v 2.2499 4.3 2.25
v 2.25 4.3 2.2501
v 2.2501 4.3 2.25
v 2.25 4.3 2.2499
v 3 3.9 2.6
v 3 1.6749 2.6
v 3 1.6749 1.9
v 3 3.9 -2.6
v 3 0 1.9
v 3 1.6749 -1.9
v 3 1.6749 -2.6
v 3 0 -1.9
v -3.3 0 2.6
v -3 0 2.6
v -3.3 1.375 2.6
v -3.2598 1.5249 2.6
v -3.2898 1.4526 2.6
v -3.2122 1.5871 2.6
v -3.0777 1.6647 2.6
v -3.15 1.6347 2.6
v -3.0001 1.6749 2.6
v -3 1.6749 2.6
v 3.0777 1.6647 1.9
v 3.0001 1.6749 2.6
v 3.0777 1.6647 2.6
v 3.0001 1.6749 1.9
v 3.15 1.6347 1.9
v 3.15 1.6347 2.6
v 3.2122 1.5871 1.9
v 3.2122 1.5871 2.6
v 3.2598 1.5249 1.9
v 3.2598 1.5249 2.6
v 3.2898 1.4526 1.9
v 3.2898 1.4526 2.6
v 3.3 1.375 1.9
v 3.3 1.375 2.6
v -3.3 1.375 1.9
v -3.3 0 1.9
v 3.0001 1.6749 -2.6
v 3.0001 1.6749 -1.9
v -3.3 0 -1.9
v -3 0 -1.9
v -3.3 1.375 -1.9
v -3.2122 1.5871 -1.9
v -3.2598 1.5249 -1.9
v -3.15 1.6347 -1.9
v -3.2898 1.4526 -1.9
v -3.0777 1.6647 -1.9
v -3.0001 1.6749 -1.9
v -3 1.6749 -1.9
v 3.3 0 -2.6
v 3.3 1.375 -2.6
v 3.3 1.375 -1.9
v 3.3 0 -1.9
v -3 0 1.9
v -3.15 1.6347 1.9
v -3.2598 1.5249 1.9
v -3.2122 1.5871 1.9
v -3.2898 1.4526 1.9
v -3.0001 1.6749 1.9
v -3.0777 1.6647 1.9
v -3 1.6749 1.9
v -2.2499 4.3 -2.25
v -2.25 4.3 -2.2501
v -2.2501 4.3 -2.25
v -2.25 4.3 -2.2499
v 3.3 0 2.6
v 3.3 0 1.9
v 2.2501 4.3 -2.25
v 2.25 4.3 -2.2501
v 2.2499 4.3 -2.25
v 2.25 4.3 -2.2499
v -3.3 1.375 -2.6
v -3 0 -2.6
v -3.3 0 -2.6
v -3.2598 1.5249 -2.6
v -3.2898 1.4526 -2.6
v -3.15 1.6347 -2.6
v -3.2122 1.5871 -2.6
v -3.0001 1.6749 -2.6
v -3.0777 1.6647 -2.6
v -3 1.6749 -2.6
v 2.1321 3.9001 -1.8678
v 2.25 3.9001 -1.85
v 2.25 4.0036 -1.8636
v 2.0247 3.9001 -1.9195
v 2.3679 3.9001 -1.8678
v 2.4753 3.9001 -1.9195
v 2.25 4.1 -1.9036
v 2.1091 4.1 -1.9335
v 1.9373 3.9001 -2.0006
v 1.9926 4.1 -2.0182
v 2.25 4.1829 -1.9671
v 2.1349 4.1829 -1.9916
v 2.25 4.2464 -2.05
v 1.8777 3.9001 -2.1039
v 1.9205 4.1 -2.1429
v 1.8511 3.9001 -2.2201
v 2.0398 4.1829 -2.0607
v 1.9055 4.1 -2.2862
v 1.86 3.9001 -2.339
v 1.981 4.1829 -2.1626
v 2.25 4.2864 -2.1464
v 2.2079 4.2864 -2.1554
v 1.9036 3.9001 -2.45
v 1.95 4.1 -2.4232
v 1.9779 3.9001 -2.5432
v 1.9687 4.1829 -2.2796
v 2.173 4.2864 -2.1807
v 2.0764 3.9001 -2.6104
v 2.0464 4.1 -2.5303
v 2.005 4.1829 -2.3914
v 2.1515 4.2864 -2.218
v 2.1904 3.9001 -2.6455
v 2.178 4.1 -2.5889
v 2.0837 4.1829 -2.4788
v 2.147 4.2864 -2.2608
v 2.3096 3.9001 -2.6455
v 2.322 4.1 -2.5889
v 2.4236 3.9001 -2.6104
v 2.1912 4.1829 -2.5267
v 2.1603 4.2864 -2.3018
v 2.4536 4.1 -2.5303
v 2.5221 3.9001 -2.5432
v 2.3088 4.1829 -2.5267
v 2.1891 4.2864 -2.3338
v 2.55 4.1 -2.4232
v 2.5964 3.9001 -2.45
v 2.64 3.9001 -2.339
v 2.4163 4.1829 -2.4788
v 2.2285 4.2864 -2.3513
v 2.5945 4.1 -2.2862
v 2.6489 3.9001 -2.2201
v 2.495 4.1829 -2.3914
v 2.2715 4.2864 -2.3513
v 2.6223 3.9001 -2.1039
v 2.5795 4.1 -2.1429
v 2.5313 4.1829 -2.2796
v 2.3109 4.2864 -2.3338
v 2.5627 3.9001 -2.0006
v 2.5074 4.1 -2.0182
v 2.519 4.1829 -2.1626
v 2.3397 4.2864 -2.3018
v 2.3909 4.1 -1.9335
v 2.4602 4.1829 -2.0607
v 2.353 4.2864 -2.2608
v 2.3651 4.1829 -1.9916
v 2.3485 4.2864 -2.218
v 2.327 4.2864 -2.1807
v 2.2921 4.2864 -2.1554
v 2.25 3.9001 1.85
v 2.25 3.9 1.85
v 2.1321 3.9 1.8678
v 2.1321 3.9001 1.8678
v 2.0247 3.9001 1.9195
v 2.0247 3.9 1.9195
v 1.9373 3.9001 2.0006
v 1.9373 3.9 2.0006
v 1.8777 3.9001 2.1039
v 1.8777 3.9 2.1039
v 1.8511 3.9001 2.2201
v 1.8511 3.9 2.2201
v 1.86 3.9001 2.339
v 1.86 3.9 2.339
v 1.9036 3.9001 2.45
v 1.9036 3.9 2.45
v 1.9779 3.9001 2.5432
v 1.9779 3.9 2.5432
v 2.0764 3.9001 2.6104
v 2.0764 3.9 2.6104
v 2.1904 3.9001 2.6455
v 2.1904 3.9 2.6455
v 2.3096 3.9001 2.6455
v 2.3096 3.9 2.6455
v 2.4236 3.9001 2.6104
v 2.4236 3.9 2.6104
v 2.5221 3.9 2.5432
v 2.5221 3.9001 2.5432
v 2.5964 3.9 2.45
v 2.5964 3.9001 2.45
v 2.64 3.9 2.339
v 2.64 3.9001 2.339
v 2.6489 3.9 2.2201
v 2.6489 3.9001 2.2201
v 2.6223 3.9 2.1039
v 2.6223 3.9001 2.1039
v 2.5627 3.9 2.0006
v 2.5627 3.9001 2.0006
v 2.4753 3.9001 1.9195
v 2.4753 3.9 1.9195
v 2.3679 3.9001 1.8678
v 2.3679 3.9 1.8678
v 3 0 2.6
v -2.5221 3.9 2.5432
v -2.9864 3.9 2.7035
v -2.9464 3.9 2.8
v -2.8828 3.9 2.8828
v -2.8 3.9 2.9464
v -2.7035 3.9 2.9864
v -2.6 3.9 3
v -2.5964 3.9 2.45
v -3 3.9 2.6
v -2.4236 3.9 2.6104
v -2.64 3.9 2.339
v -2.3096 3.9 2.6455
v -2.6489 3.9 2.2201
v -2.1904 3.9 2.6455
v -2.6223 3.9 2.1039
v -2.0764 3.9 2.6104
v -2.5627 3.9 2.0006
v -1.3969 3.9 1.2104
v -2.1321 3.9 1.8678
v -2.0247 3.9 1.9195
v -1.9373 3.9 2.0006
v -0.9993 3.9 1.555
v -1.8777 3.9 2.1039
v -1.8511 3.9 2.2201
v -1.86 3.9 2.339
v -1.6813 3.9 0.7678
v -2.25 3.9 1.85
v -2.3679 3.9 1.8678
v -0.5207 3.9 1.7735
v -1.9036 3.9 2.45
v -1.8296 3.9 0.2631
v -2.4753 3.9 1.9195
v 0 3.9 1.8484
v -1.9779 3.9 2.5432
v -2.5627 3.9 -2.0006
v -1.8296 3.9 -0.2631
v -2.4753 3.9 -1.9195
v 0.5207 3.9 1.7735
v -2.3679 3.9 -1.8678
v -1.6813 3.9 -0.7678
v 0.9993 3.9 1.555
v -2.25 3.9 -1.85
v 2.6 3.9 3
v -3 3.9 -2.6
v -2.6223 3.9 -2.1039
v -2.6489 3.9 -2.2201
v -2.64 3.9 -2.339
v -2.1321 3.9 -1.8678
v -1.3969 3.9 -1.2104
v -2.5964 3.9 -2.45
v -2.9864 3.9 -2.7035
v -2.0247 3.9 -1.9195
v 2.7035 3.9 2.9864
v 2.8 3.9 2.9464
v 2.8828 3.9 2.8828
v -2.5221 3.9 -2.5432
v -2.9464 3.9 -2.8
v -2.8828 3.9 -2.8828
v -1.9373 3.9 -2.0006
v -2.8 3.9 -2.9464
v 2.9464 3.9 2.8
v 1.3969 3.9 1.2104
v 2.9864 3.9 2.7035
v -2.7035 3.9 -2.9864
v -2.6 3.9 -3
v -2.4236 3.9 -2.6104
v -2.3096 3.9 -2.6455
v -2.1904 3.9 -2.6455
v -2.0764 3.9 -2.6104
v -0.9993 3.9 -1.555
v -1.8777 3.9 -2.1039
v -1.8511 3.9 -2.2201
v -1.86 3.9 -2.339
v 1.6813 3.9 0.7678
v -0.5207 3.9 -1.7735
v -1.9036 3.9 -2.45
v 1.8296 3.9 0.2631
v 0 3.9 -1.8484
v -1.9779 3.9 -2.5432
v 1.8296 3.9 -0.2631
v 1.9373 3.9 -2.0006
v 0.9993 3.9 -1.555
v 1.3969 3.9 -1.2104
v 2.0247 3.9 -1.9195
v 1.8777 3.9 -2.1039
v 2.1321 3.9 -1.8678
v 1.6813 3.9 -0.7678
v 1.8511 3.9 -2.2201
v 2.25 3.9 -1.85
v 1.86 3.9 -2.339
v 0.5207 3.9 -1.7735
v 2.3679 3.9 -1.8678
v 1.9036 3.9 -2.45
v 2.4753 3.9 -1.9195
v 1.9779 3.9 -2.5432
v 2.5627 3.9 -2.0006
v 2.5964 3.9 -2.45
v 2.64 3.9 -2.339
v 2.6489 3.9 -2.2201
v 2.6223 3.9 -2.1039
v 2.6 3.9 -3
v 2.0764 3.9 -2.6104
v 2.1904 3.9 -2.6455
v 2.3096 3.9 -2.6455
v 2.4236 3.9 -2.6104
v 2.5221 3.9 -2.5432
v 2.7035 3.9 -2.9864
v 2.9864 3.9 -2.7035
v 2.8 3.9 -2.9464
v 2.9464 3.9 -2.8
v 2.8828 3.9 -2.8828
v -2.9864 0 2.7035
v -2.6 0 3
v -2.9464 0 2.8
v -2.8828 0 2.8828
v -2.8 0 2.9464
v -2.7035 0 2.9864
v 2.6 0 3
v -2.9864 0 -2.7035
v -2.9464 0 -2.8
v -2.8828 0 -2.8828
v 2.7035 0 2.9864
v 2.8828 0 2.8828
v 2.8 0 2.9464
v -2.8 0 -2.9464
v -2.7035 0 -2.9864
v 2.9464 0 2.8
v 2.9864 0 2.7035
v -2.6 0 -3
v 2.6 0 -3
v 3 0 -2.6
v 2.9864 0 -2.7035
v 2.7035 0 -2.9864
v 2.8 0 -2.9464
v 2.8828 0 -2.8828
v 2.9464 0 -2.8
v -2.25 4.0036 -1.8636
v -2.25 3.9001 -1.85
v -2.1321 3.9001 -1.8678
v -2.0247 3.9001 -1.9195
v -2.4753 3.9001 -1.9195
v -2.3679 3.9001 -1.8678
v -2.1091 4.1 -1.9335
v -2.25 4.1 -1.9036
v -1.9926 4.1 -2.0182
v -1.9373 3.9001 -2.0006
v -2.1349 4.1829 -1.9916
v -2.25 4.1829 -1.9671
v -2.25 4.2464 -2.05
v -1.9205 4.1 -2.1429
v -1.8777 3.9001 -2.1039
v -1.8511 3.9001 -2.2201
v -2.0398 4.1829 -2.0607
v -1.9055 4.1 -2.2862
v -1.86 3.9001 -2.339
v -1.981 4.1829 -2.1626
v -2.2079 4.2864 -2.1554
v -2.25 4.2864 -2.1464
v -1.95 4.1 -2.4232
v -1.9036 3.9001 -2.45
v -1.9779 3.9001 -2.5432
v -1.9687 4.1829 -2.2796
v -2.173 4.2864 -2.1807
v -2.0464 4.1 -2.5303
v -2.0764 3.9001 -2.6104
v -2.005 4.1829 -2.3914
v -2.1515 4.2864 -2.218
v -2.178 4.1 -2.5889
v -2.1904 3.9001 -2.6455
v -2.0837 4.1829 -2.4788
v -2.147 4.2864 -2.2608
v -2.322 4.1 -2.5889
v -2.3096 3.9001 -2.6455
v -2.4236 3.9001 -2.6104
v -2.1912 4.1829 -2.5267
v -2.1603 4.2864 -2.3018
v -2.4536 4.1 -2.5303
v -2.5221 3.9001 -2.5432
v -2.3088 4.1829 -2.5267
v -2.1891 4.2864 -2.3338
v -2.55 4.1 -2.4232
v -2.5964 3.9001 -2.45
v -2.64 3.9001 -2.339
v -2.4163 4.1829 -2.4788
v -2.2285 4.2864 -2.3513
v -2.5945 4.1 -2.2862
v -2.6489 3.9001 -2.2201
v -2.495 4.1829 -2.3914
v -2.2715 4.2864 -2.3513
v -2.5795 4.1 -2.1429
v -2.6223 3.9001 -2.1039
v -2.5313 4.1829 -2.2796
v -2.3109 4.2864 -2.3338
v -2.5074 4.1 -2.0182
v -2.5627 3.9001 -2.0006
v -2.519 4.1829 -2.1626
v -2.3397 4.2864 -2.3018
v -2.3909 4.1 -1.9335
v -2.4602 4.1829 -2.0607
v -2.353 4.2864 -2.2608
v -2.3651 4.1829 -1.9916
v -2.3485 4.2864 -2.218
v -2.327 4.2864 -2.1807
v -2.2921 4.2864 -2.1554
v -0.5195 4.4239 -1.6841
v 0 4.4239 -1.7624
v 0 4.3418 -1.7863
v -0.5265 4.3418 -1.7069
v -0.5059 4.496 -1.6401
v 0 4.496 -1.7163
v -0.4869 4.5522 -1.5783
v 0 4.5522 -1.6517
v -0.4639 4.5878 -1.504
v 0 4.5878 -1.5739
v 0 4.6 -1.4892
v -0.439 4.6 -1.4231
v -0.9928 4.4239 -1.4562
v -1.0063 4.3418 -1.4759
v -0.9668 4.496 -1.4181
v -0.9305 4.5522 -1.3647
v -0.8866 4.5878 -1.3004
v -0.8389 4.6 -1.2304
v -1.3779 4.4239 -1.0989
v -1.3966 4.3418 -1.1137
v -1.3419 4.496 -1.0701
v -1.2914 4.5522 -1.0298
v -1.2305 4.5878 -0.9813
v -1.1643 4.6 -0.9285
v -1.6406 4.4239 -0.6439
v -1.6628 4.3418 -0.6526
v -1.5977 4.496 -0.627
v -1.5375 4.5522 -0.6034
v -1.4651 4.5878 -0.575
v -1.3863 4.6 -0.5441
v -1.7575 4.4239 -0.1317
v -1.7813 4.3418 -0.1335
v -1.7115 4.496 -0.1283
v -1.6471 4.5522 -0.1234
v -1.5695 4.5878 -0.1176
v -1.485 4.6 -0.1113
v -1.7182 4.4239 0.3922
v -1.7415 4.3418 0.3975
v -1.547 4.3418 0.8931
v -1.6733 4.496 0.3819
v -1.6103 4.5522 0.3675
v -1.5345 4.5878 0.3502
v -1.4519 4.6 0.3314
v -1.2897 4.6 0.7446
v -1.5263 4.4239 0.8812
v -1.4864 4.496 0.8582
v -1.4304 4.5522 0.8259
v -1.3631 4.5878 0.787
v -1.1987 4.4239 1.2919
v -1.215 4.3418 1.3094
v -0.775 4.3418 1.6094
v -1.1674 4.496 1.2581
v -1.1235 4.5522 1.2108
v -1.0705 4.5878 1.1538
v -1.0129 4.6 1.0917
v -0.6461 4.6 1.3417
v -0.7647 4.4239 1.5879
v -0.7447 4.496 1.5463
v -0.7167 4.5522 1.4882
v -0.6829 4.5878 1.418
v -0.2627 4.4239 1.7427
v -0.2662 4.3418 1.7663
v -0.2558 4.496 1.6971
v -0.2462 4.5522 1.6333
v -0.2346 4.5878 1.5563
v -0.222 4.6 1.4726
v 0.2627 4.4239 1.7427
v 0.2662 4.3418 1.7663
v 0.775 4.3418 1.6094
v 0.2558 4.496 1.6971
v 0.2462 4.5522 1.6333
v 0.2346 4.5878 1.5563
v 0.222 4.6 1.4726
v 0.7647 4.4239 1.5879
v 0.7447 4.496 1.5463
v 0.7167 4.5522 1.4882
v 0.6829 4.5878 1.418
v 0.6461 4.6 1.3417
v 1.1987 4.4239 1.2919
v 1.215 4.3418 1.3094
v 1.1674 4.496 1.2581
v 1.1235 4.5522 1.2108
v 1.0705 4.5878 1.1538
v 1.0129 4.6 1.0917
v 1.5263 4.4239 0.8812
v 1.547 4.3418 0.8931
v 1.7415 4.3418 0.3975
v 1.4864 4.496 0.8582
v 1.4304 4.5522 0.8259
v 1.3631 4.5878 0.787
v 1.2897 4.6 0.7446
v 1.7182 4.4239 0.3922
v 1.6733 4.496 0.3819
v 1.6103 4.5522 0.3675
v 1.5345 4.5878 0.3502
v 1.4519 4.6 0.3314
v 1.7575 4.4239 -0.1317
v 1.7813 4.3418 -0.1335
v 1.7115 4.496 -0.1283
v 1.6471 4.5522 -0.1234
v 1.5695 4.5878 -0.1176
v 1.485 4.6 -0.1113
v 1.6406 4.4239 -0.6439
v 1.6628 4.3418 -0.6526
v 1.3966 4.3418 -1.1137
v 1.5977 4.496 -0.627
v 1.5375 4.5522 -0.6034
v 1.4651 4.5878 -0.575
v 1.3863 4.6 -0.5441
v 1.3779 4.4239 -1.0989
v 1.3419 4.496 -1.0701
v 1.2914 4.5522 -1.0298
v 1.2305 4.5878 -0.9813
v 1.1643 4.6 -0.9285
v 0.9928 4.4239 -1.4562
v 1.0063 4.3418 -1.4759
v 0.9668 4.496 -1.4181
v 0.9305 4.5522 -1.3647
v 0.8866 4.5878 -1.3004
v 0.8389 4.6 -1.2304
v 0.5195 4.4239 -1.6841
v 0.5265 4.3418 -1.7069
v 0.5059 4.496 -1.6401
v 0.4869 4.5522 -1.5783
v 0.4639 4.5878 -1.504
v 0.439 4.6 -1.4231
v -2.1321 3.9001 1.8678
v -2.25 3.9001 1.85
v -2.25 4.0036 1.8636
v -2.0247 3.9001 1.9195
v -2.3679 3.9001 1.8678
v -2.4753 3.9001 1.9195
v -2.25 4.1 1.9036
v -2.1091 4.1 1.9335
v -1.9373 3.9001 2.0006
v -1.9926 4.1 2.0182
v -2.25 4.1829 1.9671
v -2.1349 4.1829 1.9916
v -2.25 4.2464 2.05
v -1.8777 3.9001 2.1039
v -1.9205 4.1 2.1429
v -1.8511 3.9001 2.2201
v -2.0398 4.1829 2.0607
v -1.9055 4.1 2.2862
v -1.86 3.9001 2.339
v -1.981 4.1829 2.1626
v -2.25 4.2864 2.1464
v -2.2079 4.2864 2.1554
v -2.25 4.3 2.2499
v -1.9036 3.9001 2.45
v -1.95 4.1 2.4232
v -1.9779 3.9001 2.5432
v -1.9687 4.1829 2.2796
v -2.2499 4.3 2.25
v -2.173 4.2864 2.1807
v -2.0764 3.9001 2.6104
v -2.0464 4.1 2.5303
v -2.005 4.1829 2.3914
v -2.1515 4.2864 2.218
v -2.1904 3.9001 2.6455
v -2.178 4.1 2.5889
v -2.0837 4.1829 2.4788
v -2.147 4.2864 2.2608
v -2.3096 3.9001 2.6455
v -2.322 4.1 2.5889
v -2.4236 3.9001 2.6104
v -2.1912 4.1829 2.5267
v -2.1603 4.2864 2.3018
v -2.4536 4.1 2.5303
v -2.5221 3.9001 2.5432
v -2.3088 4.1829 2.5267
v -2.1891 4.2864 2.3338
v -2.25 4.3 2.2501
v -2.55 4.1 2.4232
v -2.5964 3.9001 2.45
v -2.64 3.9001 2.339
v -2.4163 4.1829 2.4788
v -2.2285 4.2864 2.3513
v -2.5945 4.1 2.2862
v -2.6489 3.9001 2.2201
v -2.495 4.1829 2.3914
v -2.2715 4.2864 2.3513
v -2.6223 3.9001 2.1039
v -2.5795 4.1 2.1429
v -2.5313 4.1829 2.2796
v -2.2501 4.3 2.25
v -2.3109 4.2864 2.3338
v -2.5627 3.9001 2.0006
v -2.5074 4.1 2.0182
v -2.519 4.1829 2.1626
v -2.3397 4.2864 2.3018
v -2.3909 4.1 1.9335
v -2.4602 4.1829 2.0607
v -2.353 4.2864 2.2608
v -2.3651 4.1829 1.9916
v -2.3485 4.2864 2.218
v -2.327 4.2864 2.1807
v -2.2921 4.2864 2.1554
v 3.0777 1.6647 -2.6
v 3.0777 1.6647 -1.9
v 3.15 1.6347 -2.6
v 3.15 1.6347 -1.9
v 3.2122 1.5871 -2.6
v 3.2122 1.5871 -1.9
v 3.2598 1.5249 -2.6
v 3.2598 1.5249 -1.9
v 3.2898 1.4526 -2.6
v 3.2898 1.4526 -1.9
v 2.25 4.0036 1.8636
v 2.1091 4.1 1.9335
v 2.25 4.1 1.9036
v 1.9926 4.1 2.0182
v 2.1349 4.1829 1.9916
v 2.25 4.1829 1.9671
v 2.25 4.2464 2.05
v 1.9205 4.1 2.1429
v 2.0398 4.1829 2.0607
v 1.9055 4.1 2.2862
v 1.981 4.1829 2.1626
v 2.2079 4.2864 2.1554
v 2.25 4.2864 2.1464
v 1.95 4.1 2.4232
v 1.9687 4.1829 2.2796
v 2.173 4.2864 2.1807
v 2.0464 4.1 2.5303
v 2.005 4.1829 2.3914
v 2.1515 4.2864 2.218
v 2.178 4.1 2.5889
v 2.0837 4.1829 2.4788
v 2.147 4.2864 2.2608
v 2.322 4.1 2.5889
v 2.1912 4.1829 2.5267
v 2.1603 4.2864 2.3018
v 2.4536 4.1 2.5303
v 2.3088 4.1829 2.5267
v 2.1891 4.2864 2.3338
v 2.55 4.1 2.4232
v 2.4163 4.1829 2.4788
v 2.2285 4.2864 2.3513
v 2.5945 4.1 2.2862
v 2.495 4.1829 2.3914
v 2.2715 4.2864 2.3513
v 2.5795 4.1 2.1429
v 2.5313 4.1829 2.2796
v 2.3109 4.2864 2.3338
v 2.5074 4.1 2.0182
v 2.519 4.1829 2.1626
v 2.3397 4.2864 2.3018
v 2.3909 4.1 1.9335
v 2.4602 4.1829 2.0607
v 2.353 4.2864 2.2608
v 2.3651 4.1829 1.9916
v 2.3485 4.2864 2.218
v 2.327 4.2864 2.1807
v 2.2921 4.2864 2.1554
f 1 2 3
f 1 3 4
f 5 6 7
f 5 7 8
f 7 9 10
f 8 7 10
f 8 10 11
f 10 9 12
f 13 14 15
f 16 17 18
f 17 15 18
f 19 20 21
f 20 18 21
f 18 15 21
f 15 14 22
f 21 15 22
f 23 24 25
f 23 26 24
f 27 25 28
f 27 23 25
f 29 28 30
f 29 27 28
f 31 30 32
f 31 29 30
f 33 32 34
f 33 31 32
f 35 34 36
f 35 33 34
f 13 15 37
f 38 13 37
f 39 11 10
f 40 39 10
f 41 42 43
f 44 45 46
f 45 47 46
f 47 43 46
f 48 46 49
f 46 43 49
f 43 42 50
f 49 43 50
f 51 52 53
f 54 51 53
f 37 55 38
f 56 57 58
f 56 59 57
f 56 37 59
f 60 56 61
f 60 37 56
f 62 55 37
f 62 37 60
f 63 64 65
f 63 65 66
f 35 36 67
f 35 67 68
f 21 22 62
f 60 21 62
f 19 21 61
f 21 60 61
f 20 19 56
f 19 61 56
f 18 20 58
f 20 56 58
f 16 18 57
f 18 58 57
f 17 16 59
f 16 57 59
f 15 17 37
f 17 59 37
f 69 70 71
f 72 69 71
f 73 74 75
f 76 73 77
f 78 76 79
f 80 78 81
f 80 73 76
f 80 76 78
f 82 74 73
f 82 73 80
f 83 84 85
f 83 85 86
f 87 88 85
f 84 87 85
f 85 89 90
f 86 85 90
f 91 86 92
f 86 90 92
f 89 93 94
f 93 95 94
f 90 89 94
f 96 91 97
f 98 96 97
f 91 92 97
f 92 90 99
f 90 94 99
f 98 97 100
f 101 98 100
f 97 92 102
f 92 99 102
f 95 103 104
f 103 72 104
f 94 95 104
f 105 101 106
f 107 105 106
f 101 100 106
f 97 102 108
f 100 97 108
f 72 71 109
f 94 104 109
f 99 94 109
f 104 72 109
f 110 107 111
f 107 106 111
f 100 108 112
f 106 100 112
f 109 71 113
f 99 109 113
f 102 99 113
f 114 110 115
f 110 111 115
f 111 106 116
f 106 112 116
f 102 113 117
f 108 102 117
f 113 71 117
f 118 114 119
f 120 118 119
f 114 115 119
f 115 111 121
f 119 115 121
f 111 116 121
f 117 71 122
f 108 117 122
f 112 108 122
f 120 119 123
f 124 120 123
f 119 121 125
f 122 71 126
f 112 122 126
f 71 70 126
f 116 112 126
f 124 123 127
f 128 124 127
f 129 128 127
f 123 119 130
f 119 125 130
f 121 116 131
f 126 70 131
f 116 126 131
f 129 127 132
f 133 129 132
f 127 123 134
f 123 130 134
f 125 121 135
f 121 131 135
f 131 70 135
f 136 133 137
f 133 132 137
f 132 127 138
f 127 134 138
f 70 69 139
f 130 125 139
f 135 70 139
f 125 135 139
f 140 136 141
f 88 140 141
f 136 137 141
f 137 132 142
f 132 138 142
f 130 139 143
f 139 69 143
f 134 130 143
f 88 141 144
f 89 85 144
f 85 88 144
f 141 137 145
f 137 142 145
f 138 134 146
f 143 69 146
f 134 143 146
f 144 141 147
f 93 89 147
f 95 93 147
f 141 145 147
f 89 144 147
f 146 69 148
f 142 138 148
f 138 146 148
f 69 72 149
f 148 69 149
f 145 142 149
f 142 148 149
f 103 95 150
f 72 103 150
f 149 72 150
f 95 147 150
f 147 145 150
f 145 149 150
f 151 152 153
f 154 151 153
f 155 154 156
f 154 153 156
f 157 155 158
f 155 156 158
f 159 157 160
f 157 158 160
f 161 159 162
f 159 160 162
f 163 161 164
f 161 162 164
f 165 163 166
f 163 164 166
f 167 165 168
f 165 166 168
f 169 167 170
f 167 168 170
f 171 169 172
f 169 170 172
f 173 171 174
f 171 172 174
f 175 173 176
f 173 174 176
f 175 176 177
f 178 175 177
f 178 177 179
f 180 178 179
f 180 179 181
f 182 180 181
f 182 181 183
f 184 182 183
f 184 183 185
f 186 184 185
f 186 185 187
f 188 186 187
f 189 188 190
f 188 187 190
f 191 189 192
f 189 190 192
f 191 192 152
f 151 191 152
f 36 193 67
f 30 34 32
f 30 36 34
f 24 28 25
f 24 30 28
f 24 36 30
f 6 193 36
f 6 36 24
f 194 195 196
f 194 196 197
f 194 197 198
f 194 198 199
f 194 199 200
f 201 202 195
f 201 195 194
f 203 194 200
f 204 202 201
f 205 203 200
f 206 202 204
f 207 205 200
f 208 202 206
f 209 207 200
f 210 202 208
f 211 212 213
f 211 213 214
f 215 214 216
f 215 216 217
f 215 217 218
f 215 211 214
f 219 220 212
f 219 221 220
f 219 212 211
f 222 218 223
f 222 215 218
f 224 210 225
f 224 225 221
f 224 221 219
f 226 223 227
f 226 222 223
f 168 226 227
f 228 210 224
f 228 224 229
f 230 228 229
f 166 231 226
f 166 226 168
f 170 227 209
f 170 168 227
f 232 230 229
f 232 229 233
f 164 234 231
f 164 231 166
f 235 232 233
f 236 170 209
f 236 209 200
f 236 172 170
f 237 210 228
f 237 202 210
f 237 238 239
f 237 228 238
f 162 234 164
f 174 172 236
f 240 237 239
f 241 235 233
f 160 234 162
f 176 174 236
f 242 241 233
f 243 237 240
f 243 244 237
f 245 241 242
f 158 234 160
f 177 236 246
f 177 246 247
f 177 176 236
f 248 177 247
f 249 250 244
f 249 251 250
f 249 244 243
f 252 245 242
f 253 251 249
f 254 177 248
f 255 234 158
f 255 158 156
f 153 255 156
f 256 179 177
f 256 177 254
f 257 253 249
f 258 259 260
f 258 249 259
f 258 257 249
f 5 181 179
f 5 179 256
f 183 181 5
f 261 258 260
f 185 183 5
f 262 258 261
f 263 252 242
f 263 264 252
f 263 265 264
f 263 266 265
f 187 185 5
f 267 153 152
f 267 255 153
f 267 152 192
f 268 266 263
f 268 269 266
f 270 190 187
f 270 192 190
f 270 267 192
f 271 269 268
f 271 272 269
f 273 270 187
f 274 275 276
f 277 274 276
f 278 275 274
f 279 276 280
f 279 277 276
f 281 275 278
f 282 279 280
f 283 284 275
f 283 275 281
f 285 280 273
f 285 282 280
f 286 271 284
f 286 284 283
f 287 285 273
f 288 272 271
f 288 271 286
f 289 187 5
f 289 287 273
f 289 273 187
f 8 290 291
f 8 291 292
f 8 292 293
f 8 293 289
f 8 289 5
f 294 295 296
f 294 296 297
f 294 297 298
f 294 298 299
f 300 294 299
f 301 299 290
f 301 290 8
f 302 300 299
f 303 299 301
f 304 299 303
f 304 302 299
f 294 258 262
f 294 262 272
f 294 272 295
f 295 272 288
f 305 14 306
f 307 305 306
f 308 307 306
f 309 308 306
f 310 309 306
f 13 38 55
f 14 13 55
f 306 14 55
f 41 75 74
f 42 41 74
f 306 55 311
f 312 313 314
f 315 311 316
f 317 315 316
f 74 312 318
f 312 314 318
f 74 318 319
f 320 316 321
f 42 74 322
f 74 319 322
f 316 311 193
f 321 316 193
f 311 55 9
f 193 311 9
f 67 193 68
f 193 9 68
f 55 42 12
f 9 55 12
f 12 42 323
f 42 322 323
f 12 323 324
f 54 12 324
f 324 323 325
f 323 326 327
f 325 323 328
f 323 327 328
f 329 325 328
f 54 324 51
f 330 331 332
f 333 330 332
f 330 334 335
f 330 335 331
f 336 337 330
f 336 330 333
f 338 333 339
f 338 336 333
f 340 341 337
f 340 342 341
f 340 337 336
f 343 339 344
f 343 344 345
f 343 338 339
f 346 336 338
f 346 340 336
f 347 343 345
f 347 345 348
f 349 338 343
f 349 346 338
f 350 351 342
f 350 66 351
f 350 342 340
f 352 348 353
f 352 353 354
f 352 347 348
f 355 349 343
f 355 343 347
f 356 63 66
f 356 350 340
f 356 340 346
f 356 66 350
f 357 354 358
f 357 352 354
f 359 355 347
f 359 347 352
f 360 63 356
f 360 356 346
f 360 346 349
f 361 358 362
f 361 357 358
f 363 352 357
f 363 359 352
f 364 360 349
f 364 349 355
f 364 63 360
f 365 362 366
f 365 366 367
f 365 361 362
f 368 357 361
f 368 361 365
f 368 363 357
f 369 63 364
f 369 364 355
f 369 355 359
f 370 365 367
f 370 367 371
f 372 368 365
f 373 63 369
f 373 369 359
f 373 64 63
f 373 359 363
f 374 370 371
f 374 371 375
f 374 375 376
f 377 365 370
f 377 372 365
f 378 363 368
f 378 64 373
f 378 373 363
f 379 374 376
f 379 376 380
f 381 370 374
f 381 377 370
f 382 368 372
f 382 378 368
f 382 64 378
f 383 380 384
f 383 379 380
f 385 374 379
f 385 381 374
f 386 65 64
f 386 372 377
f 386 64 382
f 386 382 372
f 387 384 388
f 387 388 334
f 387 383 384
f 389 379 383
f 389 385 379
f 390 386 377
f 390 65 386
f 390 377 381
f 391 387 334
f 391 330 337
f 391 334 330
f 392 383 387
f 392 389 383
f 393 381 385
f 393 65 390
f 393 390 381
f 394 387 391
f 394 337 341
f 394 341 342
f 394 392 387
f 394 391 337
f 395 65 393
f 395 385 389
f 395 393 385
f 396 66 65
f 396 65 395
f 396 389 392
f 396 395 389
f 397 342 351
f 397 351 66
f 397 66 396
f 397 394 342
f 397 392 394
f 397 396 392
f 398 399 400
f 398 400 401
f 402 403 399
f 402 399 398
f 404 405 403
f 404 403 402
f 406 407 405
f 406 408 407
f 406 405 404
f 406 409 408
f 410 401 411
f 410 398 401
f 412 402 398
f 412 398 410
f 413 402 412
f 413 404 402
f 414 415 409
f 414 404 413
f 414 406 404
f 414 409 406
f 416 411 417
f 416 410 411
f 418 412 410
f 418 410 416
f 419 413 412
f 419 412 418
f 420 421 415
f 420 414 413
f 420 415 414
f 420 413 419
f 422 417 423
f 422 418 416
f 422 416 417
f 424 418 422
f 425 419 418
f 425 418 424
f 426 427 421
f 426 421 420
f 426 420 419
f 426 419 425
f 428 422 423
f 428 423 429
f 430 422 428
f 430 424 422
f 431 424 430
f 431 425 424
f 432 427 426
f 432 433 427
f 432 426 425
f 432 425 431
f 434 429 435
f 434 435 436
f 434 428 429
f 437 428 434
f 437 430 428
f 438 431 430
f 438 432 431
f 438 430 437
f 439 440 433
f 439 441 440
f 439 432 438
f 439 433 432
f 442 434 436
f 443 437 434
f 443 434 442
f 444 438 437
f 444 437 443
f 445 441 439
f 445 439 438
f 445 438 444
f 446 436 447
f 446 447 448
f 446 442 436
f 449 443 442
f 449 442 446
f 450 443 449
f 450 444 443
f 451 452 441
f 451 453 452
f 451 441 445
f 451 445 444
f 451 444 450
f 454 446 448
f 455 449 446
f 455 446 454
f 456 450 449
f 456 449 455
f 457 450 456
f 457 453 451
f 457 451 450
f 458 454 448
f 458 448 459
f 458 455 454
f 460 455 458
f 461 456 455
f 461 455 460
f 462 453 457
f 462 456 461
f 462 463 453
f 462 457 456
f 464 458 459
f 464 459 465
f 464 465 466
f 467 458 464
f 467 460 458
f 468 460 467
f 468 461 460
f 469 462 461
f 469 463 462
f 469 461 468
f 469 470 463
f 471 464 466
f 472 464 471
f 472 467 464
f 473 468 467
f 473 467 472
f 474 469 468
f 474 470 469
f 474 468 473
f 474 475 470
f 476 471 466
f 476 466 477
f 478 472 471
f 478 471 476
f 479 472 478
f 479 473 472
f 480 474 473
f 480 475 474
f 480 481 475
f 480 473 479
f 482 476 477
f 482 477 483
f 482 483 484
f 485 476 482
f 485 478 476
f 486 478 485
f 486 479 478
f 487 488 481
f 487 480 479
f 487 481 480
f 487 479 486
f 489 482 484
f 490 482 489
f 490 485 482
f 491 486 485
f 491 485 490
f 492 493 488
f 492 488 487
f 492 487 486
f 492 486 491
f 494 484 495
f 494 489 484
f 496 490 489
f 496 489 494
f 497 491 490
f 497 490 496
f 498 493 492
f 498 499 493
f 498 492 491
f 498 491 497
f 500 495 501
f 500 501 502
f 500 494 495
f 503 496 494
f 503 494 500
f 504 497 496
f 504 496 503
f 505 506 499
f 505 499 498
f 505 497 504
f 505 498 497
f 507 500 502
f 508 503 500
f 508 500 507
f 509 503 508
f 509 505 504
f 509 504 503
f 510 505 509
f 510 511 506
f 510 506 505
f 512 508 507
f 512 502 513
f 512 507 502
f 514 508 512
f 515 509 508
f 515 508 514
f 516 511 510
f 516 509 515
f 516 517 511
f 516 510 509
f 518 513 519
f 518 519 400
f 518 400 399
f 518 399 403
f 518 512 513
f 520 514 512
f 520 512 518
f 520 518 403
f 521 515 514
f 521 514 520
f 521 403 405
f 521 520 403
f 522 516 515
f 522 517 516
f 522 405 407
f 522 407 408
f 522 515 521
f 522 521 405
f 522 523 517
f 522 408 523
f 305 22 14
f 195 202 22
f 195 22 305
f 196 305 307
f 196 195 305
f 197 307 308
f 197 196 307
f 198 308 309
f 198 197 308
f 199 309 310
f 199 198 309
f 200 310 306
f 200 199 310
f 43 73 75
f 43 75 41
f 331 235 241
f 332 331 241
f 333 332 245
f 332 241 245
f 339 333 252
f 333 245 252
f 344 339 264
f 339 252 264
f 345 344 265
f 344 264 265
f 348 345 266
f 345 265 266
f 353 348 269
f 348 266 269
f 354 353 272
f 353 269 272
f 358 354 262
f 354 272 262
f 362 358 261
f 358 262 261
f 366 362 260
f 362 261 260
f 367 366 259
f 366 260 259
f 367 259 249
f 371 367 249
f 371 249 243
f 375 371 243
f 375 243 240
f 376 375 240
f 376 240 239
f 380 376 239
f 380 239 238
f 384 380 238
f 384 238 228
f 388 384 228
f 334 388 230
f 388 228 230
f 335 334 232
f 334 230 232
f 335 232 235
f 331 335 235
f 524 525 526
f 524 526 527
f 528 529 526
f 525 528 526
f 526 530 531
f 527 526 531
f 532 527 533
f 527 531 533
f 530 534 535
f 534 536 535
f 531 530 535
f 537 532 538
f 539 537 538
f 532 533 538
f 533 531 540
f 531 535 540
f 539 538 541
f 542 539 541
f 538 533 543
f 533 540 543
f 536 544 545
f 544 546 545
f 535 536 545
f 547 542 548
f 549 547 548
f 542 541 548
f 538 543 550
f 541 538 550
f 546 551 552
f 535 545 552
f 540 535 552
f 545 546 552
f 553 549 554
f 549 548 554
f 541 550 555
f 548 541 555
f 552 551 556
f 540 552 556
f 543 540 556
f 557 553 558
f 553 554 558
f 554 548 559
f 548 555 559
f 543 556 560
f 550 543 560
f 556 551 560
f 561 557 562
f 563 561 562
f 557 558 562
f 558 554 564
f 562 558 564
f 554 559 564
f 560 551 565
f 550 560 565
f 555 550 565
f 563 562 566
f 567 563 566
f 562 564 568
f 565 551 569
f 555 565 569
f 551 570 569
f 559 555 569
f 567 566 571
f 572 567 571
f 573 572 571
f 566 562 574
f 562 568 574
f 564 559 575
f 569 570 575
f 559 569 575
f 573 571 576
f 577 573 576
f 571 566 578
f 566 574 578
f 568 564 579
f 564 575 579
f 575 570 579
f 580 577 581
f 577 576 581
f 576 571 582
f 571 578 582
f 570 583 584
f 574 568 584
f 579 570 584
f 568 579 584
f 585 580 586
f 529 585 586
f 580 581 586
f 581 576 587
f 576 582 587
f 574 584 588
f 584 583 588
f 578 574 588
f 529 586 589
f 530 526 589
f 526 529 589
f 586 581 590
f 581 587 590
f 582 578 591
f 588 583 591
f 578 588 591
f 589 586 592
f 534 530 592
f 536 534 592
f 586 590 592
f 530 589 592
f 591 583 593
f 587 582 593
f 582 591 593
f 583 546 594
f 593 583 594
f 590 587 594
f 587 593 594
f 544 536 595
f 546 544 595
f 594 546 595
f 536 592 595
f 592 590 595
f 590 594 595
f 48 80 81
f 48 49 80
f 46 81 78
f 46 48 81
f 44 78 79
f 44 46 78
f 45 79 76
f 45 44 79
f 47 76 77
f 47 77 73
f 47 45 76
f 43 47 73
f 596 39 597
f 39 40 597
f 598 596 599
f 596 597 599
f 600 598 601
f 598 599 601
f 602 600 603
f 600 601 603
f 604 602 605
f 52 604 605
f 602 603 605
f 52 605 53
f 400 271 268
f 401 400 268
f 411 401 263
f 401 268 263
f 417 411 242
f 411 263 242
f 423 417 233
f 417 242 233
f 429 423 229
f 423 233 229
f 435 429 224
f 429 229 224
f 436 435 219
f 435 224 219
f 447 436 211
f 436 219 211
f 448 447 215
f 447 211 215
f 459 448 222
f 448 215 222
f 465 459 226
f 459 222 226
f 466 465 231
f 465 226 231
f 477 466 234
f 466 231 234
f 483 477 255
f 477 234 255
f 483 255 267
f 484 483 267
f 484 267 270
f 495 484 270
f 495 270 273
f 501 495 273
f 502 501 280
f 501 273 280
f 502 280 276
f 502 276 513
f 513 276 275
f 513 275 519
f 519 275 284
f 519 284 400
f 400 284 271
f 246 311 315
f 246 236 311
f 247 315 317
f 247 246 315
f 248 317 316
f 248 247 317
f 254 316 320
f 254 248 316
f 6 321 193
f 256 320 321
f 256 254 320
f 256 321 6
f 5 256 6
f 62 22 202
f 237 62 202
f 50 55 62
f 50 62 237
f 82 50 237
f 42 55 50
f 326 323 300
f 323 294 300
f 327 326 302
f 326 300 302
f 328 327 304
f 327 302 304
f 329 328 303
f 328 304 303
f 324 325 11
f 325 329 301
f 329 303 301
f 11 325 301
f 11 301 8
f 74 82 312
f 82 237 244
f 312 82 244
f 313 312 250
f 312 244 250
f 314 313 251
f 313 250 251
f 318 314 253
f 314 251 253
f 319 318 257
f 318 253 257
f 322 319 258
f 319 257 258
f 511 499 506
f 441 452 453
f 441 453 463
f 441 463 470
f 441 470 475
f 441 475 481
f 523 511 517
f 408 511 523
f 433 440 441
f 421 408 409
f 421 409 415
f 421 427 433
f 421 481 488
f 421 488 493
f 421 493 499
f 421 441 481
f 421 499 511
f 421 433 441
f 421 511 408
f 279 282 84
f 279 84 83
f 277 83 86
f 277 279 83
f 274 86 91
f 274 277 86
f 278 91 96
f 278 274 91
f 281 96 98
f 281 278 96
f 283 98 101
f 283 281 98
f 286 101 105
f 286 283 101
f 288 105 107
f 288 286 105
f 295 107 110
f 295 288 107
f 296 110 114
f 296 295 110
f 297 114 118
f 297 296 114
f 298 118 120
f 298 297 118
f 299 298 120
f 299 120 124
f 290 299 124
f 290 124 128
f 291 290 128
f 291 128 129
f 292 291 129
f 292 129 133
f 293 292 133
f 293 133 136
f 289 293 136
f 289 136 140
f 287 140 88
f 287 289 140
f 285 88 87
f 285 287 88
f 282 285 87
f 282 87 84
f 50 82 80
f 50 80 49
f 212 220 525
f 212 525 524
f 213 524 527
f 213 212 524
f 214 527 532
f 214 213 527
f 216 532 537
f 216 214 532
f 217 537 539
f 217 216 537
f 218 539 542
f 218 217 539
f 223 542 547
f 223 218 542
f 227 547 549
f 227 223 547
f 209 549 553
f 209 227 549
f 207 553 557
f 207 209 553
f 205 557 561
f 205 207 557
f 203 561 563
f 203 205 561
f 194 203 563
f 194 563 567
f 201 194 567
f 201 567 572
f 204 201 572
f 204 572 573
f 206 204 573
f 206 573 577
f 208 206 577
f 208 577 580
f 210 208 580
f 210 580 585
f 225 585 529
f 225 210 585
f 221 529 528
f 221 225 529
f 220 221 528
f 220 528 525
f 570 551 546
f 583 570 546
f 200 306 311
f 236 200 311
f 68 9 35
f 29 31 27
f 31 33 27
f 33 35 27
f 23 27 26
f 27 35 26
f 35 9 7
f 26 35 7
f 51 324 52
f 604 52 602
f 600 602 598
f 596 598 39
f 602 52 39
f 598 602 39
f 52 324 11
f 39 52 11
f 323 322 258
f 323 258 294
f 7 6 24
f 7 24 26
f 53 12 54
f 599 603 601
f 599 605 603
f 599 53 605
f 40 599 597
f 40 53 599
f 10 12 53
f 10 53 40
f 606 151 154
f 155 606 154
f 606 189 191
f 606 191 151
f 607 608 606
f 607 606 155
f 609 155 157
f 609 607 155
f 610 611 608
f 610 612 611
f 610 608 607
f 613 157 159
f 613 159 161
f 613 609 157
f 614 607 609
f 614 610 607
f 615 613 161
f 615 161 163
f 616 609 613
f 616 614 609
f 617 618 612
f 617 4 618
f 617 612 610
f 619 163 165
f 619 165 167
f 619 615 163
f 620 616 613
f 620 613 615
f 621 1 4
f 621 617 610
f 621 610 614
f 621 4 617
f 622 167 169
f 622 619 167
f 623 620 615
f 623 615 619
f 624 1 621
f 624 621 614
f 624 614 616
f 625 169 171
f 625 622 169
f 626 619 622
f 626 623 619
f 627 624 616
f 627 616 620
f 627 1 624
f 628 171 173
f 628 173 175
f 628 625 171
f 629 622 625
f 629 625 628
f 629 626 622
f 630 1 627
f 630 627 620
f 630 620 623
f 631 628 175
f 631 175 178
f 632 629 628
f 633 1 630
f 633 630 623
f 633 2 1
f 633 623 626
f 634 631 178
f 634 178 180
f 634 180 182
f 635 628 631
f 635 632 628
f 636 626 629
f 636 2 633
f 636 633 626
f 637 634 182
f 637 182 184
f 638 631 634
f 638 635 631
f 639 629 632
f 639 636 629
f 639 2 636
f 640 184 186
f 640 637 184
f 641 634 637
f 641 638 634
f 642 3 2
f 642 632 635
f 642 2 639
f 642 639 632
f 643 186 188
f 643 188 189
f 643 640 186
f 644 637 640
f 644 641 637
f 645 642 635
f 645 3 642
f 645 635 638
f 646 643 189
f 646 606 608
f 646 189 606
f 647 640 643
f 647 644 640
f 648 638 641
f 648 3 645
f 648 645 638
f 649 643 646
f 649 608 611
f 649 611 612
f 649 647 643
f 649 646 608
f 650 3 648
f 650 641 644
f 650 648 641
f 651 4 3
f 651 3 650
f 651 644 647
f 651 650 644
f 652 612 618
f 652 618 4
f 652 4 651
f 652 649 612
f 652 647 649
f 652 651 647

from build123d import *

# Parameters (mm, degrees)
SKETCH1_W               = 6
SKETCH1_H               = 6
BOSS_EXTRUDE1_DEPTH     = 3.9
SKETCH2_W               = 0.7
SKETCH2_H               = 1.674896981
BOSS_EXTRUDE2_DEPTH     = 0.3
SKETCH3_R               = 0.4
BOSS_EXTRUDE3_DEPTH     = 0.4
MIRROR2_COPY_1_SKETCH_W = 0.7
MIRROR2_COPY_1_SKETCH_H = 1.674896981
MIRROR2_COPY_1_DEPTH    = 0.3
MIRROR2_COPY_2_SKETCH_R = 0.4
MIRROR2_COPY_2_DEPTH    = 0.4
FILLET1_R               = 0.4
FILLET2_R               = 0.4
SKETCH4_R               = 1.75
BOSS_EXTRUDE4_DEPTH     = 0.7
DRAFT1_ANGLE            = 8
FILLET3_R               = 0.3
FILLET4_R               = 0.3


with BuildPart() as part:
    # Sketch1 → Boss-Extrude1 (new body)
    with BuildSketch(Plane(origin=(0, 0, 0), x_dir=(1, 0, 0), z_dir=(0, 1, 0))):
        Rectangle(SKETCH1_W, SKETCH1_H)
    extrude(amount=BOSS_EXTRUDE1_DEPTH)

    # Sketch2 → Boss-Extrude2 (add)
    with BuildSketch(Plane(origin=(3, 0, 0), x_dir=(0, 0, -1), z_dir=(1, 0, 0))):
        with Locations((-2.25, 0.837448491)):
            Rectangle(SKETCH2_W, SKETCH2_H)
    boss_extrude2 = extrude(amount=BOSS_EXTRUDE2_DEPTH)

    # Sketch3 → Boss-Extrude3 (add)
    with BuildSketch(Plane(origin=(0, 3.9, 0), x_dir=(1, 0, 0), z_dir=(0, 1, 0))):
        with Locations(Location((2.25, -2.25, 0), (0, 0, 90))):
            Circle(SKETCH3_R)
    boss_extrude3 = extrude(amount=BOSS_EXTRUDE3_DEPTH)

    # Mirror1: Boss-Extrude2, Boss-Extrude3 across plane
    add(boss_extrude2.mirror(Plane.XY))
    add(boss_extrude3.mirror(Plane.XY))

    # Mirror2: Boss-Extrude2, Boss-Extrude3 across plane
    add(boss_extrude2.mirror(Plane(origin=(0, 0, 0), x_dir=(0, 0, 1), z_dir=(1, 0, 0))))
    add(boss_extrude3.mirror(Plane(origin=(0, 0, 0), x_dir=(0, 0, 1), z_dir=(1, 0, 0))))

    # Mirror2 copy 1 sketch → Mirror2 copy 1 (add)
    with BuildSketch(Plane.ZY.offset(3)):
        with Locations((-2.25, 0.837448491)):
            Rectangle(MIRROR2_COPY_1_SKETCH_W, MIRROR2_COPY_1_SKETCH_H)
    extrude(amount=MIRROR2_COPY_1_DEPTH)

    # Mirror2 copy 2 sketch → Mirror2 copy 2 (add)
    with BuildSketch(Plane(origin=(0, 3.9, 0), x_dir=(-1, 0, 0), z_dir=(0, 1, 0))):
        with Locations(Location((2.25, -2.25, 0), (0, 0, 90))):
            Circle(MIRROR2_COPY_2_SKETCH_R)
    extrude(amount=MIRROR2_COPY_2_DEPTH)

    # Fillet1
    fillet1_edges = [part.edges().sort_by_distance(p)[0] for p in [
        (2.25, 4.3, 2.65),
        (2.25, 4.3, -2.65),
        (-2.25, 4.3, -2.65),
        (-2.25, 4.3, 2.65),
    ]]
    fillet(fillet1_edges, radius=FILLET1_R - 0.0001)  # a hair under: the kernel refuses the full size

    # Fillet2
    fillet2_edges = [part.edges().sort_by_distance(p)[0] for p in [
        (3, 1.95, -3),
        (-3, 1.95, -3),
        (-3, 1.95, 3),
        (3, 1.95, 3),
    ]]
    fillet(fillet2_edges, radius=FILLET2_R)

    # Sketch4 → Boss-Extrude4 (add)
    with BuildSketch(Plane(origin=(0, 3.9, 0), x_dir=(1, 0, 0), z_dir=(0, 1, 0))):
        with Locations(Location((0, 0, 0), (0, 0, 90))):
            Circle(SKETCH4_R)
    extrude(amount=BOSS_EXTRUDE4_DEPTH)

    # Draft1
    draft1_faces = [part.faces().sort_by_distance(p)[0] for p in [
        (0, 4.25, 1.75),
    ]]
    draft(draft1_faces, Plane.ZX.offset(4.6), DRAFT1_ANGLE)

    # Fillet3
    fillet3_edges = [part.edges().sort_by_distance(p)[0] for p in [
        (0, 4.6, 1.75),
    ]]
    fillet(fillet3_edges, radius=FILLET3_R)

    # Fillet4
    fillet4_edges = [part.edges().sort_by_distance(p)[0] for p in [
        (-3.3, 1.674896981, -2.25),
        (-3.3, 1.674896981, 2.25),
        (3.3, 1.674896981, -2.25),
        (3.3, 1.674896981, 2.25),
    ]]
    fillet(fillet4_edges, radius=FILLET4_R - 0.0001)  # a hair under: the kernel refuses the full size


solid = part.part
